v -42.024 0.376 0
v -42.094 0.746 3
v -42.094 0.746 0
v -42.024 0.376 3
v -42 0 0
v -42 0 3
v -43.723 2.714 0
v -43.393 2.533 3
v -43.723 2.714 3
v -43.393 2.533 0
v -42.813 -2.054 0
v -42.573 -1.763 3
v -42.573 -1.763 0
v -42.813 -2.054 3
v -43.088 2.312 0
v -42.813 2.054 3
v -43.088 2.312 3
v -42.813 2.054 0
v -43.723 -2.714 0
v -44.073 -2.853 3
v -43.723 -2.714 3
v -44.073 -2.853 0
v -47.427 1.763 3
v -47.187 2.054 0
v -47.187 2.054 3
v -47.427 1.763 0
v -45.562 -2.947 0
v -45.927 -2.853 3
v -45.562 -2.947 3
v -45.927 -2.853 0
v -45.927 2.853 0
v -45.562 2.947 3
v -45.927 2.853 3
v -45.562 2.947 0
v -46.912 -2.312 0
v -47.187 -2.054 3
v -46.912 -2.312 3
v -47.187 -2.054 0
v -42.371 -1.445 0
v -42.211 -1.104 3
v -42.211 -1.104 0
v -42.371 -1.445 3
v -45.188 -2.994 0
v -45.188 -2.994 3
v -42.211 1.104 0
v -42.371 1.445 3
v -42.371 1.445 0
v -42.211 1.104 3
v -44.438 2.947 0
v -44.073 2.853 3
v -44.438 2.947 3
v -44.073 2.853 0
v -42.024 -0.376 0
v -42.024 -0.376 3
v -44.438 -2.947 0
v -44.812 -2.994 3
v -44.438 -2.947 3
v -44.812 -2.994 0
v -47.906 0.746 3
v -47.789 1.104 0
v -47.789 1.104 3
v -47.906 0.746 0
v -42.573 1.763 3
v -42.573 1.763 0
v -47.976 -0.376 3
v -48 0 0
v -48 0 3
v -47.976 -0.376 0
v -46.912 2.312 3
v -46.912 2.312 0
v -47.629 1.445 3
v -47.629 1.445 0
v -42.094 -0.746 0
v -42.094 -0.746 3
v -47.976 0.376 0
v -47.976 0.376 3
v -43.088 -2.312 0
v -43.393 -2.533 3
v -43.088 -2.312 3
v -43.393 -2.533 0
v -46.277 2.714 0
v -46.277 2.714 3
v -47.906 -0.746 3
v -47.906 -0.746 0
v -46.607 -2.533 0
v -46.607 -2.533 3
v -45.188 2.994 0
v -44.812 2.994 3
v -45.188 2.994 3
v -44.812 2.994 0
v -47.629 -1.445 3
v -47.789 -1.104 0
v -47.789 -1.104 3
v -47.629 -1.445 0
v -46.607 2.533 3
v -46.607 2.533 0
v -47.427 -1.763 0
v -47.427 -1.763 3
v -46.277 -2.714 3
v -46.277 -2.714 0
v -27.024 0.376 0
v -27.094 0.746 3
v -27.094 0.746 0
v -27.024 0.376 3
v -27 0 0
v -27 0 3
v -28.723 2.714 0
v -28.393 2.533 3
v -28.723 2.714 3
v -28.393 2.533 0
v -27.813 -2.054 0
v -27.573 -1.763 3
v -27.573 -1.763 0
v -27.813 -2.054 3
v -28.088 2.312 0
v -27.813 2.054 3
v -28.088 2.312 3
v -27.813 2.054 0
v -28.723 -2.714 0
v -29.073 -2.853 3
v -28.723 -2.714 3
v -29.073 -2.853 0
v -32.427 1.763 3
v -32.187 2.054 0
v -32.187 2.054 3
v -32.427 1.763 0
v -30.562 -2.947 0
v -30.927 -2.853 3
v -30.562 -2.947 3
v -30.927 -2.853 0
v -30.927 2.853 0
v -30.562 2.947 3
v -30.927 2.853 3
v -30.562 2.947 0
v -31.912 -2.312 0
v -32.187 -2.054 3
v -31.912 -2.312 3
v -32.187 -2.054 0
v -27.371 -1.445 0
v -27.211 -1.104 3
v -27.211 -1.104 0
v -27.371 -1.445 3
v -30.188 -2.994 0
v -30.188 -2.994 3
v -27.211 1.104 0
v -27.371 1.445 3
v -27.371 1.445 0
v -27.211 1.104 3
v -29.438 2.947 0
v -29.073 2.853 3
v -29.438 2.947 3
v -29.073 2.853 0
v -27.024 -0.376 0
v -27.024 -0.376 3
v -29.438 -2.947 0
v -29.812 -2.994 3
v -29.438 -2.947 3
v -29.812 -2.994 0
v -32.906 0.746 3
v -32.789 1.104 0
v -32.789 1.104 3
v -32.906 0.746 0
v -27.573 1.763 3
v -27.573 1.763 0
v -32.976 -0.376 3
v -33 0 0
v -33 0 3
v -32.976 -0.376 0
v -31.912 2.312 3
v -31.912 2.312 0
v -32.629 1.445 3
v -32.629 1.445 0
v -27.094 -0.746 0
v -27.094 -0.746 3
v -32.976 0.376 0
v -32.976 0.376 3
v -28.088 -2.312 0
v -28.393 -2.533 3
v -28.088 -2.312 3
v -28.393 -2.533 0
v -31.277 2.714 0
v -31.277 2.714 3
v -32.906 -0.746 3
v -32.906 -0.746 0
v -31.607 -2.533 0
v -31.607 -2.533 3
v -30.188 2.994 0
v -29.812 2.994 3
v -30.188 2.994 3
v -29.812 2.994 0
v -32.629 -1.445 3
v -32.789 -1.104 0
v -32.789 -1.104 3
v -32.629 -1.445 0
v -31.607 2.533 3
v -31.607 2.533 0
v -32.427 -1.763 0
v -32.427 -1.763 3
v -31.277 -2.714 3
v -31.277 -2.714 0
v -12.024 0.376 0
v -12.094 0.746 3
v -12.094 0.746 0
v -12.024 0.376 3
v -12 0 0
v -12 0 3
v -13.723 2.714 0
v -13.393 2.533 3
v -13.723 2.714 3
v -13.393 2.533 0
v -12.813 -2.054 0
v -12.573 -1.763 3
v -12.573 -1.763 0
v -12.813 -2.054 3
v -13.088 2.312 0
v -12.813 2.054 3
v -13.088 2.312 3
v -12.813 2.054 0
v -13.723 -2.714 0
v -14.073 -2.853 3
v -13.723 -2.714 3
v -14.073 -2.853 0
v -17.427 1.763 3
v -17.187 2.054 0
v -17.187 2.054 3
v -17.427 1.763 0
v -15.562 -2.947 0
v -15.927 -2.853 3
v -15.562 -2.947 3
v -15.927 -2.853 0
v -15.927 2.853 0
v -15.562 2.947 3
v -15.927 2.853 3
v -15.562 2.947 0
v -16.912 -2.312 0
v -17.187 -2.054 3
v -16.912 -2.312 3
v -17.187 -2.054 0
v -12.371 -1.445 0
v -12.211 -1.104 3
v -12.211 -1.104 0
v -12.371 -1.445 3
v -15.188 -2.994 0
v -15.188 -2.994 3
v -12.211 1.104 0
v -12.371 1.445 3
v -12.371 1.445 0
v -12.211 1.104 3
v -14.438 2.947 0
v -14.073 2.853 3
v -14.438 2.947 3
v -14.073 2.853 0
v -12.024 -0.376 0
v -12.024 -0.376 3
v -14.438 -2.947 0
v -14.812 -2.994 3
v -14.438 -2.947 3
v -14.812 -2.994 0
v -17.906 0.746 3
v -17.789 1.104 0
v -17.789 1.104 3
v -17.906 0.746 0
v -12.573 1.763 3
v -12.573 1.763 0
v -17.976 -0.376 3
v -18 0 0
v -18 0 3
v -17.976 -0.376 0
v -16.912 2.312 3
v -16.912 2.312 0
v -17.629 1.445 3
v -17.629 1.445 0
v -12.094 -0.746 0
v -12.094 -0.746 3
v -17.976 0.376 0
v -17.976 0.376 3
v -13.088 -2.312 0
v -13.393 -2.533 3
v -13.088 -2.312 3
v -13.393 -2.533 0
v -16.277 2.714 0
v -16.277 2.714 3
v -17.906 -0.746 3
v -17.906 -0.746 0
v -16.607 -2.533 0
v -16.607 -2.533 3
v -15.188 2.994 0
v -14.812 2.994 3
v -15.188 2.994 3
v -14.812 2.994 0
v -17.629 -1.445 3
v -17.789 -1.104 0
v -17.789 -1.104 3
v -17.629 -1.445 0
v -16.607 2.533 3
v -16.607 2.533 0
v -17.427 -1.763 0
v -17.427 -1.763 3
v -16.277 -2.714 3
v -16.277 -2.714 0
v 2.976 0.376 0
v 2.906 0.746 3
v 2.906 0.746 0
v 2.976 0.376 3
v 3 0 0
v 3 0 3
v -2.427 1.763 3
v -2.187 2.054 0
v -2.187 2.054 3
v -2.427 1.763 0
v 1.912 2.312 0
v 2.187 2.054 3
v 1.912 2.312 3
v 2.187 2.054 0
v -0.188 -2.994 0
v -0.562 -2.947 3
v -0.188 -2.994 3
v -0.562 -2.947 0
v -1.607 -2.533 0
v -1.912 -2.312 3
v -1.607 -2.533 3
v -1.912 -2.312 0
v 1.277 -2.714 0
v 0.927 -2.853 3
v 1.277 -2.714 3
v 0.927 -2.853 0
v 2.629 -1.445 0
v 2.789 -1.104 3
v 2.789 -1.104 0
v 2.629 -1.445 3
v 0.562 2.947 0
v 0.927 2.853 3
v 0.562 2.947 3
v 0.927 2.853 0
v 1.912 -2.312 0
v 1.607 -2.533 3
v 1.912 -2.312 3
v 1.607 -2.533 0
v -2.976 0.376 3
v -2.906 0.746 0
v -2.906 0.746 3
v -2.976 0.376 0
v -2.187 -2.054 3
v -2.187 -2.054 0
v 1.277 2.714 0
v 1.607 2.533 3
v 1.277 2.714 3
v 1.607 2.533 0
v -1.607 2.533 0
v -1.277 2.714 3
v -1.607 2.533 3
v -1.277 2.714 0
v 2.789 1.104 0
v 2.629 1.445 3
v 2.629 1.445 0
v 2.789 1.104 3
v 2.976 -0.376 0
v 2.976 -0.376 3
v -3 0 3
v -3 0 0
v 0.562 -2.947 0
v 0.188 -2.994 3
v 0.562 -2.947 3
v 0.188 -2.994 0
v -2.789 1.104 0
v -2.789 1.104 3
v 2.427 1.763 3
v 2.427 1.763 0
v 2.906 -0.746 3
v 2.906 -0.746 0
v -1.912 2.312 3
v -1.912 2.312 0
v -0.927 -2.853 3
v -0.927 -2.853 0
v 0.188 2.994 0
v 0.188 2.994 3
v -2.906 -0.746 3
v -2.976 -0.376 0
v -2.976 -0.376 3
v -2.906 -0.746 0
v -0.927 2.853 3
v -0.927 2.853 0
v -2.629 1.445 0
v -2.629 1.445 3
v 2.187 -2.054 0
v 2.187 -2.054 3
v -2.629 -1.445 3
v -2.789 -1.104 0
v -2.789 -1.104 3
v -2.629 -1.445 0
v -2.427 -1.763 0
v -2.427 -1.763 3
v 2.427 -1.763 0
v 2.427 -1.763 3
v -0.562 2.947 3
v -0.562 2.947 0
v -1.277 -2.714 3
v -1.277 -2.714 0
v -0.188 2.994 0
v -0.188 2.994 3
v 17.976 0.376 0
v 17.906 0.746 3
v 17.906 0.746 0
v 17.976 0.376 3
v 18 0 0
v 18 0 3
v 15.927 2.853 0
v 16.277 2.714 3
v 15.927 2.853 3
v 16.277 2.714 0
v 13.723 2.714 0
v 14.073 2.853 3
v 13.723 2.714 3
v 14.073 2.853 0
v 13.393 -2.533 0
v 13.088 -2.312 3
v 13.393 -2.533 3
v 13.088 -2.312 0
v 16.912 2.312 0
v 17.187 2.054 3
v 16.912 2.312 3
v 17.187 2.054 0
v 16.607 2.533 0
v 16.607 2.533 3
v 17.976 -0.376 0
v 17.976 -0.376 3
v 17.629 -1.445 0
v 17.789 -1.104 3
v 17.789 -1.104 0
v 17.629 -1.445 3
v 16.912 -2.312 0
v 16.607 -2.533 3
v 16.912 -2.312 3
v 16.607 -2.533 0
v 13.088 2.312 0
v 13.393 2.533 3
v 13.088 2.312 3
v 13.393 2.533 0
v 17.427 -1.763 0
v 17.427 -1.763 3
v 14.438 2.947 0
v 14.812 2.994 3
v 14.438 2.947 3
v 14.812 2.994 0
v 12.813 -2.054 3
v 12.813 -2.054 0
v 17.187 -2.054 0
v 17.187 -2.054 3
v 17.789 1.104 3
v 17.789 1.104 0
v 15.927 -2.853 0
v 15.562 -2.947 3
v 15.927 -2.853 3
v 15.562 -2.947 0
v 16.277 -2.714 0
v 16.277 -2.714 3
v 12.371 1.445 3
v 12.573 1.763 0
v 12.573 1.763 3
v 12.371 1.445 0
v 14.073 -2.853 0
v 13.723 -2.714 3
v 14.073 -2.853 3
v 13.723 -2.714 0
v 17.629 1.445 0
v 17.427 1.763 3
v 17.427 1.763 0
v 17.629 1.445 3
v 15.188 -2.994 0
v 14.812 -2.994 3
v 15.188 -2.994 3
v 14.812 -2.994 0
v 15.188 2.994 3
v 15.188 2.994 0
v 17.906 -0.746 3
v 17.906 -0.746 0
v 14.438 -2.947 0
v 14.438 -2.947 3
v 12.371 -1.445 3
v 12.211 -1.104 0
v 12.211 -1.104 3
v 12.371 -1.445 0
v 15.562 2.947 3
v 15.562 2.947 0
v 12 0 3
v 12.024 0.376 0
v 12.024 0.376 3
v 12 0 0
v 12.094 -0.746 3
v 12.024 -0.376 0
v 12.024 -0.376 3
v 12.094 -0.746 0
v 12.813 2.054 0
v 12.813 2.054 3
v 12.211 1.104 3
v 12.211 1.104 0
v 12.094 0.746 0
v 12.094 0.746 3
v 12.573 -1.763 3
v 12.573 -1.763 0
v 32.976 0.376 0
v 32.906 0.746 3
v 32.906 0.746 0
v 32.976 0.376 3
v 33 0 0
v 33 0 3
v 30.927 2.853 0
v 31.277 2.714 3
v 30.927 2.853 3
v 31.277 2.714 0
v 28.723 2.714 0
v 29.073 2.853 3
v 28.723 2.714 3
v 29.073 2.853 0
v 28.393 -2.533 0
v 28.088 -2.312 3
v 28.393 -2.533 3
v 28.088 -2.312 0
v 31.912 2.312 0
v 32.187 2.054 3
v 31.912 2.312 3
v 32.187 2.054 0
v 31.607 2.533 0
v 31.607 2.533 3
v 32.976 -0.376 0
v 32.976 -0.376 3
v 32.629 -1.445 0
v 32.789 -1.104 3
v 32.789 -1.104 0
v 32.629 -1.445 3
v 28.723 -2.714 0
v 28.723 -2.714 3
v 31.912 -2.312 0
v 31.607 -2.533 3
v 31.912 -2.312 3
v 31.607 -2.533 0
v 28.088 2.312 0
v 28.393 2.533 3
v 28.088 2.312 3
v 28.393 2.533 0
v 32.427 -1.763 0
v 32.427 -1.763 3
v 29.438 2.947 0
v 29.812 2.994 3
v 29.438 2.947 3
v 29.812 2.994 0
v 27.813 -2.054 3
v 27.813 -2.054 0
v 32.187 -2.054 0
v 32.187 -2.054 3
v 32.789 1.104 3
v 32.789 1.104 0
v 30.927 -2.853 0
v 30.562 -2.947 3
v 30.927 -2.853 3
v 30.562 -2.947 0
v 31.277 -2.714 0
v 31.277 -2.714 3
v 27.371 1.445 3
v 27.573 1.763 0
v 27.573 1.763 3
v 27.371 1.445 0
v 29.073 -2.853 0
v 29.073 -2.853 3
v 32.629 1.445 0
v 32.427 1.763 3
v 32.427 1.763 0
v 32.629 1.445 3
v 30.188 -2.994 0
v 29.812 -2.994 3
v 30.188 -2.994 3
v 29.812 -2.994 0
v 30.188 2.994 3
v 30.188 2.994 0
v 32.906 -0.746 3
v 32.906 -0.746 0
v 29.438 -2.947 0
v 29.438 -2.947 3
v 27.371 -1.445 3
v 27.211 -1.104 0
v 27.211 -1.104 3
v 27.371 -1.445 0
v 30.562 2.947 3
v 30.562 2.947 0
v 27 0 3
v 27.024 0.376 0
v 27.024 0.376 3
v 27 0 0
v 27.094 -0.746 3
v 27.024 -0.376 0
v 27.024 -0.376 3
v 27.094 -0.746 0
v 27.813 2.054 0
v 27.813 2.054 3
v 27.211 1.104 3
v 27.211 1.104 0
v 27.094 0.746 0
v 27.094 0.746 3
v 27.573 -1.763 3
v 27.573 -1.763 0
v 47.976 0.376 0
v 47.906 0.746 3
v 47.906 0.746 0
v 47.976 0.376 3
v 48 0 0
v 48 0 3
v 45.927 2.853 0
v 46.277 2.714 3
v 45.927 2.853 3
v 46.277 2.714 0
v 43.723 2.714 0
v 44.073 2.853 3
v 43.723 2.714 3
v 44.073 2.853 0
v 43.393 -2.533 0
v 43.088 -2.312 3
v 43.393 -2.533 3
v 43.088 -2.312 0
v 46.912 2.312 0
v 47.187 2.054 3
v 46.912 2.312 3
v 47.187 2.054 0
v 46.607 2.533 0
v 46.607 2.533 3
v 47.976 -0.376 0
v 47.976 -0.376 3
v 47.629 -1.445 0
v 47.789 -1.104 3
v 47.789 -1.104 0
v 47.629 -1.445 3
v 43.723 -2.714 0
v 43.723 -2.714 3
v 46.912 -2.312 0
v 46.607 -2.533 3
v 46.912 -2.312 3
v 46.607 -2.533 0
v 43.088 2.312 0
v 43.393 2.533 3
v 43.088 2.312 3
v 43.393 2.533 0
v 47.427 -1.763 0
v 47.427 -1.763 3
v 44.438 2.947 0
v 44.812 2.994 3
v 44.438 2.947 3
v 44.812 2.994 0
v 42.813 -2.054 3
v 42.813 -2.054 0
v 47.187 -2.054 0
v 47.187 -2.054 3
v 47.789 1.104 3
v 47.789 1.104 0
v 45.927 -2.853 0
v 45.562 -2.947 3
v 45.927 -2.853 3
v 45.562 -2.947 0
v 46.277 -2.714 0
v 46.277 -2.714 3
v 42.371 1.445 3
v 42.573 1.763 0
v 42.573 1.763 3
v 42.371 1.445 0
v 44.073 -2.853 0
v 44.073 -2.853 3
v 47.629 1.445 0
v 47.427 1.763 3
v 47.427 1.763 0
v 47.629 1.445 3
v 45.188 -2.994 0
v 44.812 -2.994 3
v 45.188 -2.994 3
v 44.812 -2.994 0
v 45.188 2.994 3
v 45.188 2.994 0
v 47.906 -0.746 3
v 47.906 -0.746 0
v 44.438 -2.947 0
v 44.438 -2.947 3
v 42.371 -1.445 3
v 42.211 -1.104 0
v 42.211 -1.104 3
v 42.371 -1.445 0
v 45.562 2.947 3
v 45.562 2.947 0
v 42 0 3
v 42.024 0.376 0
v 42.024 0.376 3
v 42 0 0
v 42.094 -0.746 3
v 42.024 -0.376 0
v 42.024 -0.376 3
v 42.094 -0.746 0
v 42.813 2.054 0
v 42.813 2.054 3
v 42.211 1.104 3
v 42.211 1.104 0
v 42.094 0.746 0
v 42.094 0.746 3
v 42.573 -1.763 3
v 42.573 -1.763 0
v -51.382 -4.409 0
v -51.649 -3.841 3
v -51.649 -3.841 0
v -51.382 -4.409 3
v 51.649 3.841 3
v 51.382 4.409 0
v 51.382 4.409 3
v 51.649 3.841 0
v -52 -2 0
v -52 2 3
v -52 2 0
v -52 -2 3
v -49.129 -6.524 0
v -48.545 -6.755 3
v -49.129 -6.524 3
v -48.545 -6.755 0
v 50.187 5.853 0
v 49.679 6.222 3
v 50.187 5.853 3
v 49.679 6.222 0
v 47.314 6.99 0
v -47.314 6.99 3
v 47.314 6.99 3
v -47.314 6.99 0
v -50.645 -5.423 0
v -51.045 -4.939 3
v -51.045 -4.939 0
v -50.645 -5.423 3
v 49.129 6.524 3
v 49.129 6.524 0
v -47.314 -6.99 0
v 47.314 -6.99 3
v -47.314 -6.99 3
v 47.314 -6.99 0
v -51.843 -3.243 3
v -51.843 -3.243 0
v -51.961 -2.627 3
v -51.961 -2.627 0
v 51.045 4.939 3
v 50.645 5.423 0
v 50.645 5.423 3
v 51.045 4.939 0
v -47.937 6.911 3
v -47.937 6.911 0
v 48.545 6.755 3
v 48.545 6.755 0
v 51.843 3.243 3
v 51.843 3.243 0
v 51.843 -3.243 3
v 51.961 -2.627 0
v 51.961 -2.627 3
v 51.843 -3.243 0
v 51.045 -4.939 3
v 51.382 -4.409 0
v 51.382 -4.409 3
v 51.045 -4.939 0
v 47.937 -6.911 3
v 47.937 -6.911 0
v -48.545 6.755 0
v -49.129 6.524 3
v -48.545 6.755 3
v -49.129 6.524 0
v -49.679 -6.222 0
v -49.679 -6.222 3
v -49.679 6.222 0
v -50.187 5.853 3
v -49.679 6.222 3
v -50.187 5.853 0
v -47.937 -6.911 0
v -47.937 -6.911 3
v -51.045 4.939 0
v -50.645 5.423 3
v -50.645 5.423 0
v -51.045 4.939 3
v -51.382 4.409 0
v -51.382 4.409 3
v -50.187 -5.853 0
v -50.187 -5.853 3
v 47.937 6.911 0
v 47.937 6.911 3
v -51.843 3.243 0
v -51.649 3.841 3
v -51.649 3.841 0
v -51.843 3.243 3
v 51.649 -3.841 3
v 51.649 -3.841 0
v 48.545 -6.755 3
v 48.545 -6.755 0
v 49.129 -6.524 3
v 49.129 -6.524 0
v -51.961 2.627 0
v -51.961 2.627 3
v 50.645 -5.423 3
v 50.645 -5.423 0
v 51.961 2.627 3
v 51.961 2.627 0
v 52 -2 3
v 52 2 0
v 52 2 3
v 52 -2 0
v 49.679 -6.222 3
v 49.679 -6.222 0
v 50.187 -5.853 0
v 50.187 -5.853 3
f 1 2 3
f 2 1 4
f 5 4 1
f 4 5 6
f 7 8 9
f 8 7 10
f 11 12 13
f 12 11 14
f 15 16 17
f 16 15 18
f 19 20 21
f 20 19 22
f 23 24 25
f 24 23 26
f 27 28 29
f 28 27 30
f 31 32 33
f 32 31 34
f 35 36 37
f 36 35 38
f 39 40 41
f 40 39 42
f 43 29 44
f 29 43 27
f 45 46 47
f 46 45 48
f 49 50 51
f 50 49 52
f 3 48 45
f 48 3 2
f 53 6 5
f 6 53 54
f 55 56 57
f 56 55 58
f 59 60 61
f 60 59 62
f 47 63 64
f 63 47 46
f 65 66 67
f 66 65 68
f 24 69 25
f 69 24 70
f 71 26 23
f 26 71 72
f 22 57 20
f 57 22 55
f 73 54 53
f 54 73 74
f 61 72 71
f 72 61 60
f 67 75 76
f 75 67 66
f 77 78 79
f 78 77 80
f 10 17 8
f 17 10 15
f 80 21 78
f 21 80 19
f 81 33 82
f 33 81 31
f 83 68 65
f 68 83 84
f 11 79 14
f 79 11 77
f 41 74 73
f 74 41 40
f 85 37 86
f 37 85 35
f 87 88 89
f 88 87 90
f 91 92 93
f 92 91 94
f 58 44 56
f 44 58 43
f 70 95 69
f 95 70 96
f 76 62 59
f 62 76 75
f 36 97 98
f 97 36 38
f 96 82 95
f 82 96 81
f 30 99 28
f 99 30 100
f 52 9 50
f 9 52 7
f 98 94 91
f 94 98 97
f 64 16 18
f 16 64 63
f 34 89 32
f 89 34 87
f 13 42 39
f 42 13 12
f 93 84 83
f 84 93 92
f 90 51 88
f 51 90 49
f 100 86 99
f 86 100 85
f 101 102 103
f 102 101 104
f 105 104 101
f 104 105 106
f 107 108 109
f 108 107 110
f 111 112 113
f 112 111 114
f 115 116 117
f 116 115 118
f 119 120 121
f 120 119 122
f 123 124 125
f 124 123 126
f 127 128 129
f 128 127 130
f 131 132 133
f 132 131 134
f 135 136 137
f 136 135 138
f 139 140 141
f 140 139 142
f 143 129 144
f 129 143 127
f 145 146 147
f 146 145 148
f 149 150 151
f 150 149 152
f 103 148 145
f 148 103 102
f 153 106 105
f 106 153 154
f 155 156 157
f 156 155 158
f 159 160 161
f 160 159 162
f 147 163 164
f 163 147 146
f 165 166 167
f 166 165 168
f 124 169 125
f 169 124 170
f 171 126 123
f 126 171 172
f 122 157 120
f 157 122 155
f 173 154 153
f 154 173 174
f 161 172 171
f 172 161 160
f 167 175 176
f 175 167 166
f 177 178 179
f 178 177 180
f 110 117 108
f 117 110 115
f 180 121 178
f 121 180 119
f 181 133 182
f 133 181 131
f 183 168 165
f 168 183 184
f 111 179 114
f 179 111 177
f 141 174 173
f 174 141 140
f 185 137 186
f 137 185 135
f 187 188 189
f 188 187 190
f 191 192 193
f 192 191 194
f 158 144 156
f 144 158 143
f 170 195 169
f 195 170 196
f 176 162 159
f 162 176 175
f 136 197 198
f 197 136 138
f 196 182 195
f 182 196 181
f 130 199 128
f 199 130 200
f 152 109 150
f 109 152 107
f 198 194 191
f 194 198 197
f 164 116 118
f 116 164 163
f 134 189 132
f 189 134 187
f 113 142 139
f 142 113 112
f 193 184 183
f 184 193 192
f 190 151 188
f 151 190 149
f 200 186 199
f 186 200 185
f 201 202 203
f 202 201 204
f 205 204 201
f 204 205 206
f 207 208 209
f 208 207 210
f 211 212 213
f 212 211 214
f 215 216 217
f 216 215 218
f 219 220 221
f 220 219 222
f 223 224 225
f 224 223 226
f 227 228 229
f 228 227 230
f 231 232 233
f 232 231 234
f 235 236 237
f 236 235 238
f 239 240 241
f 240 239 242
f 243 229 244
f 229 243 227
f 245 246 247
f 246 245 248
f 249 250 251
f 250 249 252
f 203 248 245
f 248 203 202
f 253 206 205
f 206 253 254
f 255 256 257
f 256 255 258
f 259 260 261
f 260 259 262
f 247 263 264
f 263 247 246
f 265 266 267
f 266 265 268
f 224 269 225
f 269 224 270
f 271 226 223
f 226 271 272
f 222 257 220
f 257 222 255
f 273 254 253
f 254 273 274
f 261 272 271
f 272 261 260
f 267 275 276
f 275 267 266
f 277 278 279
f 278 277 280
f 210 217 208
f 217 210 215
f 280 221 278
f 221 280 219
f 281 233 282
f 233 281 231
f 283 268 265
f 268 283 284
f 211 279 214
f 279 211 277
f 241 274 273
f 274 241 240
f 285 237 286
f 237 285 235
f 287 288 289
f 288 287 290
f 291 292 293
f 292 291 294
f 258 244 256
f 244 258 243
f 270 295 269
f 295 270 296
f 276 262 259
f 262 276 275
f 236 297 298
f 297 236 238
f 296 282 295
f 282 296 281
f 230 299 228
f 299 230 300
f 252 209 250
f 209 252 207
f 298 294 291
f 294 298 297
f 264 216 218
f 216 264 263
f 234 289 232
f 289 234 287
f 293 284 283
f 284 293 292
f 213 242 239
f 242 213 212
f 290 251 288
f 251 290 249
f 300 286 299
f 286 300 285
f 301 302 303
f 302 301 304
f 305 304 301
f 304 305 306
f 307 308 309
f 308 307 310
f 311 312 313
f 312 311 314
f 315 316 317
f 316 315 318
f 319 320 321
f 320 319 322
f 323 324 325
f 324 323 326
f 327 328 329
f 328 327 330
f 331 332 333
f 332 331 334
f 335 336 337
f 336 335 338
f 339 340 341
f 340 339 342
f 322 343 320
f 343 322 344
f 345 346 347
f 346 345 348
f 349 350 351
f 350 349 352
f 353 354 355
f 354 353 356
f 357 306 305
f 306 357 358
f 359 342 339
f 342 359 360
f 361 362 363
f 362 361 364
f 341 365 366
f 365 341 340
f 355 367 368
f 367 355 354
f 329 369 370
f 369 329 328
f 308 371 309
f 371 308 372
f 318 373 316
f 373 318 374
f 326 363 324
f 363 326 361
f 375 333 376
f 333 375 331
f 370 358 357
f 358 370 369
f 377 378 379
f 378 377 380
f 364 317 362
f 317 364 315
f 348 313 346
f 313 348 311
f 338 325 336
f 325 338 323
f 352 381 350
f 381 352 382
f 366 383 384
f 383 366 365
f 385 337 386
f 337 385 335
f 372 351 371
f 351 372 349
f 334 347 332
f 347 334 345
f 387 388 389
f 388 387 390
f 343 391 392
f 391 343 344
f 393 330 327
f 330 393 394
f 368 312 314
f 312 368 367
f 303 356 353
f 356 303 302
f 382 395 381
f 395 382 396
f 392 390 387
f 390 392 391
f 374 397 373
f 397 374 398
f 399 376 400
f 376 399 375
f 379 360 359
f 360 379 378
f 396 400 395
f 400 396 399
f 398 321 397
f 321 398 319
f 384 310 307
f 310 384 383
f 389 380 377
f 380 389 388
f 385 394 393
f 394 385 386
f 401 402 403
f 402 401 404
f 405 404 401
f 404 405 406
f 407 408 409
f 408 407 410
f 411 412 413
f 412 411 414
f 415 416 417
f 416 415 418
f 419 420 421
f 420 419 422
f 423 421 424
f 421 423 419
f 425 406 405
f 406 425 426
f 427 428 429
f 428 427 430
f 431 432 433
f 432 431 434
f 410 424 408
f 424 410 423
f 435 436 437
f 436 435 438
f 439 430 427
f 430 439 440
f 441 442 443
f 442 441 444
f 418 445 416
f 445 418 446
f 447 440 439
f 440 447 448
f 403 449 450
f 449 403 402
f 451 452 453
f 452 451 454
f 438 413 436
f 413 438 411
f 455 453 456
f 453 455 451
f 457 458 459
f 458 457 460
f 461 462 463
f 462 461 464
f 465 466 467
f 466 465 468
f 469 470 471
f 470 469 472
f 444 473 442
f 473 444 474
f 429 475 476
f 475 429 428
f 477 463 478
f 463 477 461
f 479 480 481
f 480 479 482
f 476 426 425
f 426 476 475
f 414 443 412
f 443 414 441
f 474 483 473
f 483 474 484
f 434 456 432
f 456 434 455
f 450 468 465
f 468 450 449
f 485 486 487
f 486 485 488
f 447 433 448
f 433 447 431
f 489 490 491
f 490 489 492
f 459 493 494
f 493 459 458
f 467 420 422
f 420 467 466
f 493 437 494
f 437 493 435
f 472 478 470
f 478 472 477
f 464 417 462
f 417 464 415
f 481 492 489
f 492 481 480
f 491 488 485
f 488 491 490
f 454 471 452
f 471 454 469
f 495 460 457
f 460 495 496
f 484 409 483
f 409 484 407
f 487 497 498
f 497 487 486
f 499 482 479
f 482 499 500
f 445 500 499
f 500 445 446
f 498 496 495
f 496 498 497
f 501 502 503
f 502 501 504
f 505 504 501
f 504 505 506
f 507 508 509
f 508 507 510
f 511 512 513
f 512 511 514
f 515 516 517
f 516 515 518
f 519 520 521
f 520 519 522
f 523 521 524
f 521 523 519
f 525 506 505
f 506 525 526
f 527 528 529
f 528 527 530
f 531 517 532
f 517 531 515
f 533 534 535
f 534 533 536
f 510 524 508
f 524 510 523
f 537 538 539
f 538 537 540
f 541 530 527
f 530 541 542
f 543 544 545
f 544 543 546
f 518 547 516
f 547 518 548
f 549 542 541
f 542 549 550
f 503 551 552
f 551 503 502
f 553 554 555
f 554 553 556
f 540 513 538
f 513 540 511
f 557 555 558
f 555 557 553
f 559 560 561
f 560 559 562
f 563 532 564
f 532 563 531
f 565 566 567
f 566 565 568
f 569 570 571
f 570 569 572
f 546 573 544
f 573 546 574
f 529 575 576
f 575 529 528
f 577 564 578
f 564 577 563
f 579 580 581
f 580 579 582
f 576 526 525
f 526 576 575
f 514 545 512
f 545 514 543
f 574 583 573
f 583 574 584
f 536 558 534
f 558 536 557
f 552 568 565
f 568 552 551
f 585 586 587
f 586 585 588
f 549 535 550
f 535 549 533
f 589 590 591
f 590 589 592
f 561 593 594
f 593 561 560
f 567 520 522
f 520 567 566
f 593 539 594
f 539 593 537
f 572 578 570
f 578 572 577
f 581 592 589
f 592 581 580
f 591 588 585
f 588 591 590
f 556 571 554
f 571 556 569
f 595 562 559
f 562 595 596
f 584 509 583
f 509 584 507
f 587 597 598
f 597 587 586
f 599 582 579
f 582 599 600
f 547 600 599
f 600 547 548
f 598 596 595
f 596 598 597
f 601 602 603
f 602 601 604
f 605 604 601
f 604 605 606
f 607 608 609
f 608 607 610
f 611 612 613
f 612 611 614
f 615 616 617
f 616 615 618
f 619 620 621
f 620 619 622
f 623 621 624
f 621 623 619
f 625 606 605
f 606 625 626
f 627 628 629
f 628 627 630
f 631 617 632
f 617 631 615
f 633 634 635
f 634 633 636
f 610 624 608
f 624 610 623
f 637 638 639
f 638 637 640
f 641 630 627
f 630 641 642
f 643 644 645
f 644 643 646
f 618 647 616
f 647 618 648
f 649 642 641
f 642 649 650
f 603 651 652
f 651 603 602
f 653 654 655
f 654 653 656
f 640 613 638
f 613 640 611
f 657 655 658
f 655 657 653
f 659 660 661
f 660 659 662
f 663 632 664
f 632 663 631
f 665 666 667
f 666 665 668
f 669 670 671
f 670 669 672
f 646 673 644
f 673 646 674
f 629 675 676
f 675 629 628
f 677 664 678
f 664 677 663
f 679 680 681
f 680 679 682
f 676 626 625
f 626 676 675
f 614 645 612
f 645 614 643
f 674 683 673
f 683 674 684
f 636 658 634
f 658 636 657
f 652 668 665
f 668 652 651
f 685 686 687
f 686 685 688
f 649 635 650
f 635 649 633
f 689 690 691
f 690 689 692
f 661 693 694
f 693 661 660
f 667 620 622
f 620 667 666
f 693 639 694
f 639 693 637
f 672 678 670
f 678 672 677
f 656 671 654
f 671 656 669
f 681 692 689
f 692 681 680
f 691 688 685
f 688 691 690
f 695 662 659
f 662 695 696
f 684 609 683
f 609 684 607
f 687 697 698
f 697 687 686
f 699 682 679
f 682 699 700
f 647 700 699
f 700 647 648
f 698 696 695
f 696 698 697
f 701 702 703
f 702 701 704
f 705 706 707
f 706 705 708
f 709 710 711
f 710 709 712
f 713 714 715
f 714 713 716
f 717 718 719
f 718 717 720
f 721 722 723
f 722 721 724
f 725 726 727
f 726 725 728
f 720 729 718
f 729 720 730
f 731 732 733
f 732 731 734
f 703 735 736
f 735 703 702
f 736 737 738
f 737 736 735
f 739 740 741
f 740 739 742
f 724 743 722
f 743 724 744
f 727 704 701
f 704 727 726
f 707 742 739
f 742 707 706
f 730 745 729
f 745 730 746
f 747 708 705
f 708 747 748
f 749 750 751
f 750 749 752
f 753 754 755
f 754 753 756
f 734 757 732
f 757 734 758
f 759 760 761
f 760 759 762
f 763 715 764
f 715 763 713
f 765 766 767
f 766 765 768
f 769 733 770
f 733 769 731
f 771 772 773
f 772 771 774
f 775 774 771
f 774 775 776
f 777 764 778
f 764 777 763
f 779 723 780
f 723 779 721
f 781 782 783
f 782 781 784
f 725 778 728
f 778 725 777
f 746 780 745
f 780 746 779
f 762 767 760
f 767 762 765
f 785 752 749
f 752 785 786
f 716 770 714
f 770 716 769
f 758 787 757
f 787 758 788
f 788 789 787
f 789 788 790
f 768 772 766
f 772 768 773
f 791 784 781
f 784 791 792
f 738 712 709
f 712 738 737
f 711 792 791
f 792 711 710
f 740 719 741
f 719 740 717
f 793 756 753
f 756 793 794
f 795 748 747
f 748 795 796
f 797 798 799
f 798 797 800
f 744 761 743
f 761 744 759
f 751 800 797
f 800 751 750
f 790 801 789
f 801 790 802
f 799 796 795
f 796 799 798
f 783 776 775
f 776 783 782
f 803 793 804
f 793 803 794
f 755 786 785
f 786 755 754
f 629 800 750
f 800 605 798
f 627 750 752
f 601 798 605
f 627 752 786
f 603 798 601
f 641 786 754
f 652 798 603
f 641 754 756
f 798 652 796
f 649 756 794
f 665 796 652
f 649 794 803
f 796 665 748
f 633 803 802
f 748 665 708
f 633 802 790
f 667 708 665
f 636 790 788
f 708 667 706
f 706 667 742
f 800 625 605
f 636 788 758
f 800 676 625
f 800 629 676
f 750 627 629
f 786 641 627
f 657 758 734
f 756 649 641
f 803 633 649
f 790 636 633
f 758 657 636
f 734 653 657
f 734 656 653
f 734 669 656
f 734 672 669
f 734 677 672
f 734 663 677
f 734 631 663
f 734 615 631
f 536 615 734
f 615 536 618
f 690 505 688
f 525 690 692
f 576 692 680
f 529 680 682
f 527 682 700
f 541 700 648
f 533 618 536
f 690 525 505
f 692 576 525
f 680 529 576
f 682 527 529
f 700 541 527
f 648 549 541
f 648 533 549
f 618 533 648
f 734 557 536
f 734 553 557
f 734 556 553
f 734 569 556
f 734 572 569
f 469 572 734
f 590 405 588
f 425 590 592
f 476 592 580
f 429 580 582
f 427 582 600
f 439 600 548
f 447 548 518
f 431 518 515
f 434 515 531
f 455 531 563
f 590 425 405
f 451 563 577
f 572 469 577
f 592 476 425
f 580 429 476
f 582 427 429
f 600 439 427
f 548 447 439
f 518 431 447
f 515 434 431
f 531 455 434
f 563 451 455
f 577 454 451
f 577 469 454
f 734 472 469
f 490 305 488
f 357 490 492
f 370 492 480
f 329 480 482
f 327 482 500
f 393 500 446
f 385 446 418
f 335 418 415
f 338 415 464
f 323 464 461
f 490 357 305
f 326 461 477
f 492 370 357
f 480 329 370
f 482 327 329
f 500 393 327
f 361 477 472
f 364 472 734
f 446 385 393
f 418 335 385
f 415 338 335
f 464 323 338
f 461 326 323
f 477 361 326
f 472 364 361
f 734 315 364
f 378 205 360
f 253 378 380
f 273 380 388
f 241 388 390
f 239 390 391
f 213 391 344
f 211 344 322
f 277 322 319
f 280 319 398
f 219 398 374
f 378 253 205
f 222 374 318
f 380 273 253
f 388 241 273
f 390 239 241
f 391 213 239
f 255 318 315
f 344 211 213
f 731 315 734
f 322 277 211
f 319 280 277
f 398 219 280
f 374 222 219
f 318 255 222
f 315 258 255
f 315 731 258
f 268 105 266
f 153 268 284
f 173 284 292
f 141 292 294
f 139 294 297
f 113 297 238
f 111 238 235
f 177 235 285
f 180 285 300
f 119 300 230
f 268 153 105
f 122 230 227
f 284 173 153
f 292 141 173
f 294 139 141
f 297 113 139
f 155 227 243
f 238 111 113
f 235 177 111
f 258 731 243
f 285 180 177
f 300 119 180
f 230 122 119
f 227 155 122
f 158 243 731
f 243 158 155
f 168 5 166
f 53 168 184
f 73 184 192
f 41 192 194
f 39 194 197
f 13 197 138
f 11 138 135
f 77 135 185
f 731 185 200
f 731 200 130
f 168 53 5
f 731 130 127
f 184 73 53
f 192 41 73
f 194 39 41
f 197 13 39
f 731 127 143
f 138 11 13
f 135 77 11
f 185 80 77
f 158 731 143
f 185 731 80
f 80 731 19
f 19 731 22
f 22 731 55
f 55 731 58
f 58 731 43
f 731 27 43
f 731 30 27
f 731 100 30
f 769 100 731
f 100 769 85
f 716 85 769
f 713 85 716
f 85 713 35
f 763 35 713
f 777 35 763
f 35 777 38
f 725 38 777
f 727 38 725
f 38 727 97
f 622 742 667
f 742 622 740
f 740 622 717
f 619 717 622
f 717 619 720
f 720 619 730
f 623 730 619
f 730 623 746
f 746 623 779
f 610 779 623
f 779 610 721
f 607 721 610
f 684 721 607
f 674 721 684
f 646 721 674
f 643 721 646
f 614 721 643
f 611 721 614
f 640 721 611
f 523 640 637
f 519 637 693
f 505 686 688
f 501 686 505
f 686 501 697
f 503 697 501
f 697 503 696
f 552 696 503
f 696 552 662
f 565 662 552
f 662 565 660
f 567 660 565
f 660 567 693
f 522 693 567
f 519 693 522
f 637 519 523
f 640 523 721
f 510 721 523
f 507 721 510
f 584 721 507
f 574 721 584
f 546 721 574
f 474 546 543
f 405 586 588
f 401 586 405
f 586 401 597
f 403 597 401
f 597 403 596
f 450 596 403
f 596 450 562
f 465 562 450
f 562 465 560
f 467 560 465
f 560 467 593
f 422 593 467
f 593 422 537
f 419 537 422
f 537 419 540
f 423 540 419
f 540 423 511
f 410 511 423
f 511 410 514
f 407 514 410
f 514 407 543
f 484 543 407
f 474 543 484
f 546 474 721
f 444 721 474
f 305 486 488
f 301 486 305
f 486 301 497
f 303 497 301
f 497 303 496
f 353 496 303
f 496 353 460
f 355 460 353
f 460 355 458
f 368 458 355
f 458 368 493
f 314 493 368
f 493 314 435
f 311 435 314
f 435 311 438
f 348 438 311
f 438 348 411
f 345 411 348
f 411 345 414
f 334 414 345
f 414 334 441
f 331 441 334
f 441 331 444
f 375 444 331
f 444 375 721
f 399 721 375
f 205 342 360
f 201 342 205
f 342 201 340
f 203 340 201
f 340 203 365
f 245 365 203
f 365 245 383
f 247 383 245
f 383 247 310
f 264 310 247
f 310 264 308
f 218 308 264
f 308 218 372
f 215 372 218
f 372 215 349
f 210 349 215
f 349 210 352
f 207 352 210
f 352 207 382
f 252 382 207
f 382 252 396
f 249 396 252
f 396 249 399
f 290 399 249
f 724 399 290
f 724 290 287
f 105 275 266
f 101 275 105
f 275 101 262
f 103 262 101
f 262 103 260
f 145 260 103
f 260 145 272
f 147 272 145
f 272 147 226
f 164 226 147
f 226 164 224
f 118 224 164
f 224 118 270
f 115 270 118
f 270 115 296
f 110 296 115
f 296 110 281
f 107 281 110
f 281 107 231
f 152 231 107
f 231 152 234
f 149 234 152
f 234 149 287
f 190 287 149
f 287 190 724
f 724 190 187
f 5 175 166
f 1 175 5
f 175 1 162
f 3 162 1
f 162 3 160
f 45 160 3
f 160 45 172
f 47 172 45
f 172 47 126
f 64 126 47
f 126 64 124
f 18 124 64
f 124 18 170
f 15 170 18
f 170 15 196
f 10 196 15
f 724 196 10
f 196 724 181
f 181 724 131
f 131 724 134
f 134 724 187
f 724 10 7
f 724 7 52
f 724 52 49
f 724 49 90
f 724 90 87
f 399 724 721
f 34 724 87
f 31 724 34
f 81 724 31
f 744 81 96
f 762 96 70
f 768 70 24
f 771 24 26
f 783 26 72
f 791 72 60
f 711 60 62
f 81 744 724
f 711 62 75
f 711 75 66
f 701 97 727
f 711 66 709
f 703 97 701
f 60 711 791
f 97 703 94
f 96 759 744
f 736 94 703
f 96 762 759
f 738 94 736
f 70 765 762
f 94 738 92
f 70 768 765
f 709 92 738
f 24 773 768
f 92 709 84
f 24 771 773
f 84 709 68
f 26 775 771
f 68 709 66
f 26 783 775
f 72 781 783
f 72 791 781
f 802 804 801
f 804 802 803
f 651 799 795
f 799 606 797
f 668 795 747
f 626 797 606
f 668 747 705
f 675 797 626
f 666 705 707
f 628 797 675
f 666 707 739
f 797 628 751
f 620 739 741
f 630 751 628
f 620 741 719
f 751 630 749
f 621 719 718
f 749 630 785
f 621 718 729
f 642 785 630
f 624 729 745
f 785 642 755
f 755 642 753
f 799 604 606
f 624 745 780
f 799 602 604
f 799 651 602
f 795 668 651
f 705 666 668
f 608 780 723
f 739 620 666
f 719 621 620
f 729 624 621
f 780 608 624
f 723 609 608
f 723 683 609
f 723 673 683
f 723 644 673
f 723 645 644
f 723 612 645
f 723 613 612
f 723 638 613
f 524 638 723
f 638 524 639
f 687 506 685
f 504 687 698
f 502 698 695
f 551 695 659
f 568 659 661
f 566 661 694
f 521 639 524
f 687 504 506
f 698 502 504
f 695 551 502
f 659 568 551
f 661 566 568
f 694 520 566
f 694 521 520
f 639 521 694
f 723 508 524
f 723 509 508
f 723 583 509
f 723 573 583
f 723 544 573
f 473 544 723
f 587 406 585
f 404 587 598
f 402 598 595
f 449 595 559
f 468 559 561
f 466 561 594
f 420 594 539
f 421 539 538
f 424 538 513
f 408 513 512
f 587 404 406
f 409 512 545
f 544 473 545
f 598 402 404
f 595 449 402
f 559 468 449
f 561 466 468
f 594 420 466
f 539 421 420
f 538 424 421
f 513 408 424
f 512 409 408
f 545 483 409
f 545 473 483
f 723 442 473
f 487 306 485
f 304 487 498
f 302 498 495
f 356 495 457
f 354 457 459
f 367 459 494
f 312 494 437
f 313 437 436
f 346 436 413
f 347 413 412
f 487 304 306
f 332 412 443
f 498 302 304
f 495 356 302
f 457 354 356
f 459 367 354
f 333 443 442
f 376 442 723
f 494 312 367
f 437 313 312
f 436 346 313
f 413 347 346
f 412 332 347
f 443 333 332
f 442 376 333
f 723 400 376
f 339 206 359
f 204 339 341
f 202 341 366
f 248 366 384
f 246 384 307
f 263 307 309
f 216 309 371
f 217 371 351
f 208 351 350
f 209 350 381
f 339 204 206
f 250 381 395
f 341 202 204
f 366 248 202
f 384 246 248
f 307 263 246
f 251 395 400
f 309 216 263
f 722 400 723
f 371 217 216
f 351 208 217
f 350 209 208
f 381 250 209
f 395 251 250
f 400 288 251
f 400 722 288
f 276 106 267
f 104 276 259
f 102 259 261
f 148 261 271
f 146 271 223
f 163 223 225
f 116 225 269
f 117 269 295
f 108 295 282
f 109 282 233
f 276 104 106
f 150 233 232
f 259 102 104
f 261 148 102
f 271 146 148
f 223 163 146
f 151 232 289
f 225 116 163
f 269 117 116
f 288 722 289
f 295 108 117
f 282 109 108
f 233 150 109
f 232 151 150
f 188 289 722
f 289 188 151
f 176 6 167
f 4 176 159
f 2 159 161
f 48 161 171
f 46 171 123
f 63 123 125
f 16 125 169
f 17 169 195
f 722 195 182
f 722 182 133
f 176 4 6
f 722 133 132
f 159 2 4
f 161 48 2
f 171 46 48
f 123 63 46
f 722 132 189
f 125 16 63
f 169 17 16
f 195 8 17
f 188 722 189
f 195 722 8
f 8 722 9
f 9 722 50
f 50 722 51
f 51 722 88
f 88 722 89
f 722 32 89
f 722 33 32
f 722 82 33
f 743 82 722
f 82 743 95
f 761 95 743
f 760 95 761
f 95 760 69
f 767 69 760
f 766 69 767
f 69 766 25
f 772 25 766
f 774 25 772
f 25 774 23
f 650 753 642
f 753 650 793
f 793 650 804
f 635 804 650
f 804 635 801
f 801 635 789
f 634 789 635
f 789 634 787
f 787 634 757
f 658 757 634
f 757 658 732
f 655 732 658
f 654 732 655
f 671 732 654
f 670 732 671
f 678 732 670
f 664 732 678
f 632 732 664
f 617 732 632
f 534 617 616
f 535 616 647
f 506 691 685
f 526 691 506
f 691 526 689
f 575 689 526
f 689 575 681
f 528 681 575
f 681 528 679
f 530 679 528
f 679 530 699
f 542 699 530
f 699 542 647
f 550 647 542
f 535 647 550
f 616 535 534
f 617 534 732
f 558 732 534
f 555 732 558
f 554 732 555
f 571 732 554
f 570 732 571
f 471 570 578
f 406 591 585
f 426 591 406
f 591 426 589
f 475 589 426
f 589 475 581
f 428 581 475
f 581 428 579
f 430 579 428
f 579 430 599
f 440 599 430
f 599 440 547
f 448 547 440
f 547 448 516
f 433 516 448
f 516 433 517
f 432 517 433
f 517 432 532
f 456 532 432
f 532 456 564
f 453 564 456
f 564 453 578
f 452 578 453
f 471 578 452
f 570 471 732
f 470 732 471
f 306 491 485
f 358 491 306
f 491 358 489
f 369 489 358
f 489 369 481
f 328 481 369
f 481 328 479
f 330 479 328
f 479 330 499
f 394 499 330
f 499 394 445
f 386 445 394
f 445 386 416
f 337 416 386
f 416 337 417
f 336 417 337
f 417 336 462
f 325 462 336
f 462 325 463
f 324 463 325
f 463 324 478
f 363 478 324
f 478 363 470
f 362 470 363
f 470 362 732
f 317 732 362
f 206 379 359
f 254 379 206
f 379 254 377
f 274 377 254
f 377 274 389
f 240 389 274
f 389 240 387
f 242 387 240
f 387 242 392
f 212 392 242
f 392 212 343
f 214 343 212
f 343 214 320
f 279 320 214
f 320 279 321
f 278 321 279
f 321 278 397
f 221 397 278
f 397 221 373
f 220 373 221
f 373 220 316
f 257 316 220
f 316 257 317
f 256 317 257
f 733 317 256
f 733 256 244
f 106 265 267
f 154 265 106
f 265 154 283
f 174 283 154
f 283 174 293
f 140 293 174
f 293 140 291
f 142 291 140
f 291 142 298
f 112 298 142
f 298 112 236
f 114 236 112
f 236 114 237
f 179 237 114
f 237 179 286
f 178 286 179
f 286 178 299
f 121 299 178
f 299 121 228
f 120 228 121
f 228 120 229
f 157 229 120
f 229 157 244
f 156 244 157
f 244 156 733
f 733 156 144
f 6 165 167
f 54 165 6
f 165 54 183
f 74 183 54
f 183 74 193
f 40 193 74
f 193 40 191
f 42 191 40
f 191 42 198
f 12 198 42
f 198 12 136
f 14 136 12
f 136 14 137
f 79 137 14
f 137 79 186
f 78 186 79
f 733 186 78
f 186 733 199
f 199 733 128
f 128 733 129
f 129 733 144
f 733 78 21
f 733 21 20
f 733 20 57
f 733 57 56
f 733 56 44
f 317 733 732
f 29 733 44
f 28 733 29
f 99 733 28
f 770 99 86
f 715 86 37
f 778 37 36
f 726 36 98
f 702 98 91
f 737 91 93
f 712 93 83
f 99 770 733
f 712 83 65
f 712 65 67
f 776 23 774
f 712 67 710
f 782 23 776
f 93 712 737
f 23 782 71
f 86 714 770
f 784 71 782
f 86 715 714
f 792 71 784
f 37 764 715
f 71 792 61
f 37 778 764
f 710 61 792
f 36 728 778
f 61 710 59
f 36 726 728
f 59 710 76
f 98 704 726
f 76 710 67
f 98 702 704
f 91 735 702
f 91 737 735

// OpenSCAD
// Generated by SolidPython 1.1.3 on 2023-03-12 22:44:58
$fn = 50;


difference() {
	union() {
		translate(v = [0, 0, 0]) {
			rotate(a = [0, 0, 0]) {
				hull() {
					translate(v = [-47.0000000000, 2.0000000000, 0]) {
						rotate(a = [0, 0, 0]) {
							translate(v = [0, 0, 0]) {
								rotate(a = [0, 0, 0]) {
									cylinder(h = 3, r = 5);
								}
							}
						}
					}
					translate(v = [47.0000000000, 2.0000000000, 0]) {
						rotate(a = [0, 0, 0]) {
							translate(v = [0, 0, 0]) {
								rotate(a = [0, 0, 0]) {
									cylinder(h = 3, r = 5);
								}
							}
						}
					}
					translate(v = [-47.0000000000, -2.0000000000, 0]) {
						rotate(a = [0, 0, 0]) {
							translate(v = [0, 0, 0]) {
								rotate(a = [0, 0, 0]) {
									cylinder(h = 3, r = 5);
								}
							}
						}
					}
					translate(v = [47.0000000000, -2.0000000000, 0]) {
						rotate(a = [0, 0, 0]) {
							translate(v = [0, 0, 0]) {
								rotate(a = [0, 0, 0]) {
									cylinder(h = 3, r = 5);
								}
							}
						}
					}
				}
			}
		}
	}
	union() {
		translate(v = [-45.0000000000, 0.0000000000, 0]) {
			rotate(a = [0, 0, 0]) {
				translate(v = [0, 0, -50]) {
					rotate(a = [0, 0, 0]) {
						cylinder(h = 100, r = 3.0000000000);
					}
				}
			}
		}
		translate(v = [-30.0000000000, 0.0000000000, 0]) {
			rotate(a = [0, 0, 0]) {
				translate(v = [0, 0, -50]) {
					rotate(a = [0, 0, 0]) {
						cylinder(h = 100, r = 3.0000000000);
					}
				}
			}
		}
		translate(v = [-15.0000000000, 0.0000000000, 0]) {
			rotate(a = [0, 0, 0]) {
				translate(v = [0, 0, -50]) {
					rotate(a = [0, 0, 0]) {
						cylinder(h = 100, r = 3.0000000000);
					}
				}
			}
		}
		translate(v = [0.0000000000, 0.0000000000, 0]) {
			rotate(a = [0, 0, 0]) {
				translate(v = [0, 0, -50]) {
					rotate(a = [0, 0, 0]) {
						cylinder(h = 100, r = 3.0000000000);
					}
				}
			}
		}
		translate(v = [15.0000000000, 0.0000000000, 0]) {
			rotate(a = [0, 0, 0]) {
				translate(v = [0, 0, -50]) {
					rotate(a = [0, 0, 0]) {
						cylinder(h = 100, r = 3.0000000000);
					}
				}
			}
		}
		translate(v = [30.0000000000, 0.0000000000, 0]) {
			rotate(a = [0, 0, 0]) {
				translate(v = [0, 0, -50]) {
					rotate(a = [0, 0, 0]) {
						cylinder(h = 100, r = 3.0000000000);
					}
				}
			}
		}
		translate(v = [45.0000000000, 0.0000000000, 0]) {
			rotate(a = [0, 0, 0]) {
				translate(v = [0, 0, -50]) {
					rotate(a = [0, 0, 0]) {
						cylinder(h = 100, r = 3.0000000000);
					}
				}
			}
		}
	}
}
/***********************************************
*********      SolidPython code:      **********
************************************************
 
from solid import *
import os
import subprocess

import oomB

import opsc_library_gen

mode = "laser"
#mode = "3d_print"

defined_objects = {}

radius_dict = {}
countersunk_dict = {}


def set_mode(m):
    global mode
    mode = m
    radius_dict['M6'] = 6.5/2
    radius_dict['M3'] = 3.3/2
    if mode == "laser":
        radius_dict['M6'] = 6/2
        radius_dict['M3'] = 3/2

    countersunk_dict['M3'] = {}
    countersunk_dict['M3']['little_rad'] = radius_dict['M3']
    countersunk_dict['M3']['big_rad'] = (5.5+0.6)/2
    if mode == "laser":
        countersunk_dict['M3']['big_rad'] = (4.75+0.6)/2
        countersunk_dict['M3']['little_rad'] = (4.75+0.6)/2

    countersunk_dict['M3']['height'] = 1.7


def opsc_make_object(filename, objects, save_type="none",resolution=50, layers = 1, tilediff = 200, mode="laser", overwrite=True):
    if overwrite or not os.path.exists(filename):
        set_mode(mode)
        save_type = save_type.lower()
        os.makedirs(os.path.dirname(filename), exist_ok=True)
        final_object = opsc_get_object(objects, mode = mode)
        # Save the final object to the specified filename    
        scad_render_to_file(final_object, filename, file_header='$fn = %s;' % resolution, include_orig_code=True)
        if mode == "laser":
            filename_laser = filename.replace(".scad","-flat.scad")
            scad_render_to_file(getLaser(final_object, layers=layers, tilediff=tilediff), filename_laser, file_header='$fn = %s;' % resolution, include_orig_code=True)
            if save_type == "all":
                saveToAll(filename_laser)
            elif save_type == "dxf":
                saveToDxf(filename_laser)
        if save_type == "all":
            saveToAll(filename)
        elif save_type == "dxf":
            saveToDxf(filename)


def opsc_get_object(objects, mode = "laser"):
    # Create the solidpython objects only include the positive objects and if they don't have inclusion or their inclusion is either all or mode
    # Initialize an empty list to store the results
    positive_objects = []

    # Iterate over the "objects" list
    for obj in objects:
        # Check if the current object has a "type" key with a value of "positive"
        if obj['type'] == 'positive':
            # Check if the current object has an "inclusion" key and its value matches "mode",
            # or if the current object does not have an "inclusion" key at all
            if not 'inclusion' in obj or obj['inclusion'] == "all" or obj['inclusion'] == mode:
                # Call the "get_opsc_item" function with the current object as an argument
                opsc_item = get_opsc_item(obj)
                # Add the result to the "positive_objects" list
                positive_objects.append(opsc_item)
# Initialize an empty list to store the results
    negative_objects = []

    # Iterate over the "objects" list
    for obj in objects:
        # Check if the current object has a "type" key with a value of "negative"
        if obj['type'] == 'negative':
            # Check if the current object has an "inclusion" key and its value matches "mode",
            # or if the current object does not have an "inclusion" key at all
            if not 'inclusion' in obj or obj['inclusion'] == "all" or obj['inclusion'] == mode:
                # Call the "get_opsc_item" function with the current object as an argument
                opsc_item = get_opsc_item(obj)
                # Add the result to the "negative_objects" list
                negative_objects.append(opsc_item)
    
    #positive_objects = [get_opsc_item(obj) for obj in objects if obj['type'] == 'positive']
    #negative_objects = [get_opsc_item(obj) for obj in objects if obj['type'] == 'negative']
    # Union the positive objects
    positive_object = union()(*positive_objects)
    # Union the negative objects
    negative_object = union()(*negative_objects)
    # Create the final object by subtracting the negative objects from the positive objects
    return difference()(positive_object, negative_object)

def get_opsc_item(params):
    # A dictionary to map radius string values to numerical values
    #radius_dict = {'small': 5, 'medium': 10, 'large': 15}
    # An array of function names for basic shapes
    basic_shapes = ['cube', 'sphere', 'cylinder']
    
    # An array of function names for other shapes
    other_shapes = ['hole', 'slot', 'rounded_rectangle', 'countersunk']
    


    # Convert radius to r if present, and remove radius from the params dictionary
    if 'radius' in params:
        if isinstance(params['radius'], str):
            # Use the radius_dict to map the radius string value to a numerical value
            params['r'] = radius_dict[params['radius']]
        else:
            params['r'] = params['radius']
        del params['radius']
    

    # Check if the object type is a basic shape
    if params['shape'] in basic_shapes:
        # Remove shape and unexpected dictionary values
        allowed_keys = {'size', 'r', 'r1', 'r2', 'd', 'h', 'rw', 'rh', 'dw', 'dh'}
        shape_params = {k: v for k, v in params.items() if k in allowed_keys}

        # Call the corresponding function for the shape parameter, using ** notation to pass the shape_params dictionary as keyword arguments
        return get_opsc_transform(params,globals()[params['shape']](**shape_params))
    
    # If the object type is not a basic shape, check if it's a defined object or one of the other shapes
    elif params['shape'] in other_shapes:
        # Call the corresponding function for the shape parameter, passing the params dictionary as an argument
        p2 = copy.deepcopy(params)
        p2["pos"] = [0,0,0]
        return get_opsc_transform(params,globals()[params['shape']](p2))
    
    # If the object is not a basic shape or a defined object, try to import it from a .scad file
    else:
        obj = defined_objects[params['shape']]
        return get_opsc_transform(params,obj)

def get_opsc_transform(params, solid_obj):
    # Rotate the object based on the 'rot' field in the params dictionary, or the 'rotX', 'rotY', and 'rotZ' fields if 'rot' is not present
    rot = params.get('rot', [])
    if rot:
        rotX, rotY, rotZ = rot
    else:
        rotX = params.get('rotX', 0)
        rotY = params.get('rotY', 0)
        rotZ = params.get('rotZ', 0)
    solid_obj = rotate([rotX, rotY, rotZ])(solid_obj)

    # Translate the object based on the 'pos' field in the params dictionary, or the 'x', 'y', and 'z' fields if 'pos' is not present
    pos = params.get('pos', [])
    if pos:
        x, y, z = pos
    else:
        x = params.get('x', 0)
        y = params.get('y', 0)
        z = params.get('z', 0)
    solid_obj = translate([x, y, z])(solid_obj)
    return solid_obj


import random

def opsc_easy_array(type, shape, repeats, pos_start, shift_arr, **kwargs):
    for i in range(0,3):
        repeats.append(1)
        pos_start.append(0)
        shift_arr.append(0)
    return_objects = []

    for x in range(0,repeats[0]):
        for y in range(0,repeats[1]):
            for z in range(0,repeats[2]):
                return_objects.append(opsc_easy(type, shape, pos=[pos_start[0]+x*shift_arr[0],pos_start[1]+y*shift_arr[1],pos_start[2]+z*shift_arr[2]], **kwargs))
    return return_objects                



def opsc_easy(type, shape, **kwargs):
    obj = {
        'type': type,
        'shape': shape
    }
    for param in ['size', 'r', 'r1', 'r2', 'd', 'h', 'rw', 'rh', 'dw', 'dh', 'pos', 'x', 'y', 'z', 'rot', 'rotX', 'rotY', 'rotZ', "w", "inclusion"]:
        if param in kwargs:
            obj[param] = kwargs[param]
    return obj

def hole(params):
    p2 = copy.deepcopy(params)  
    # Check if the radius is a string and replace it with the corresponding value from the dictionary
    if isinstance(p2['r'], str):
        p2['r'] = radius_dict[p2['r']]
    
    # Set the height to 100 if not specified
    if 'h' not in p2:
        p2['h'] = 100
        p2["pos"] = [0,0,-50]
    p2["center"] = True
    # Create the cylinder object
    p2["shape"] = "cylinder"
    p2["type"] = "positive"

    return get_opsc_item(p2)

import copy

def countersunk(params):
    p2 = copy.deepcopy(params)
    counter_rad = p2['r']
    p2['r'] = radius_dict[p2['r']]
    hp = copy.deepcopy(p2)
    hp["type"] = "positive"
    hp["shape"] = "hole"
    del hp["rot"]
    hol = get_opsc_item(hp)
    
    cp = copy.deepcopy(p2)
    cp["h"] = countersunk_dict[counter_rad]["height"]
    cp["r2"] = countersunk_dict[counter_rad]["little_rad"]
    cp["r1"] = countersunk_dict[counter_rad]["big_rad"]
    del cp["r"]
    del cp["rot"]
    cp["type"] = "positive"
    cp["shape"] = "cylinder"
    cp["pos"] = [0,0,0]

    top = get_opsc_item(cp)
    return union()(hol,top)



def slot(params):  
    p2 = copy.deepcopy(params) 
    if isinstance(p2['r'], str):
        p2['r'] = radius_dict[p2['r']]
    p2["type"] = "positive"
    p2["shape"] = "hole"
    del p2["rot"]
    p2["pos"] = [0,0,0]
    left = copy.deepcopy(p2)
    right = copy.deepcopy(p2)
    left["pos"][0] = p2["w"] / 2 - p2["r"] 
    
    right["pos"][0] = -p2["w"] / 2 + p2["r"] 
    pass
    leftObj = get_opsc_item(left)
    rightObj = get_opsc_item(right)
    return hull()(leftObj, rightObj)

def rounded_rectangle(params):   
    p2 = copy.deepcopy(params) 
    p2["h"] = p2["size"][2]
    p2["pos"] = p2.get("pos", [0, 0, 0]) 
    p2["type"] = "positive"
    p2["shape"] = "hole"
    p2["pos"] = [0,0,0]
    
    if 'rot' in p2:
        del p2["rot"]   
    if 'r' not in p2:
        p2["r"] = 5 
    tl = copy.deepcopy(p2)
    tr = copy.deepcopy(p2)
    bl = copy.deepcopy(p2)
    br = copy.deepcopy(p2)
    tl["pos"][0] = -(p2["size"][0] - p2["r"]*2)/2
    tl["pos"][1] = (p2["size"][1] - p2["r"]*2)/2
    tr["pos"][0] = (p2["size"][0] - p2["r"]*2)/2
    tr["pos"][1] = (p2["size"][1] - p2["r"]*2)/2
    bl["pos"][0] = -(p2["size"][0] - p2["r"]*2)/2
    bl["pos"][1] = -(p2["size"][1] - p2["r"]*2)/2
    br["pos"][0] = (p2["size"][0] - p2["r"]*2)/2
    br["pos"][1] = -(p2["size"][1] - p2["r"]*2)/2
    del tl["size"]
    del tr["size"]
    del bl["size"]
    del br["size"]
    tlo = get_opsc_item(tl)
    tro = get_opsc_item(tr)
    blo = get_opsc_item(bl)
    bro = get_opsc_item(br)    
    return hull()(tlo, tro, blo, bro)



def import_scad_object(filename):
    # Import the .scad file and convert it to a solidpython object
    #filename = "parts"
    obj = import_scad(filename)
    return obj.main()
    


import os
import solid as solidpython

# A dictionary to store the defined objects


def load_scad_objects():
    opsc_library_gen.gen_library(defined_objects)

import random

def test(num_objects):
    objects = []
    for i in range(num_objects):
        # Choose a random shape
        #shape = random.choice(['cube', 'sphere', 'cylinder', 'hole', 'slot', "rounded_rectangle"])
        shape = random.choice(["rounded_rectangle"])

        # Choose a random type
        type = random.choice(['positive', 'negative'])
        
        # Create an empty object dictionary
        obj = {'shape': shape, 'type': type}
        
        # Set shape-specific parameters
        if obj['shape'] in ['cube']:
            obj['size'] =  [random.uniform(5, 15), random.uniform(5, 15), random.uniform(5, 15)]
        if obj['shape'] in ['rounded_rectangle']:
            obj['size'] =  [random.uniform(5, 15), random.uniform(5, 15), random.uniform(5, 15)]
            obj['r'] = random.uniform(0.5, 5)
        elif obj['shape'] == 'sphere':
            obj['r'] = random.uniform(5, 15)
        elif obj['shape'] in ['cylinder', 'hole']:
            obj['r'] = random.uniform(0.5, 5)
            obj['h'] = random.uniform(5, 15)
        elif obj['shape'] == 'slot':
            obj['r'] = random.uniform(0.5, 5)
            obj['h'] = random.uniform(5, 15)
            obj['w'] = random.uniform(5, 15)
        
        # Set a random position and rotation
        obj['pos'] = [random.uniform(-20, 20), random.uniform(-20, 20), random.uniform(-20, 20)]
        obj['rot'] = [random.uniform(-180, 180), random.uniform(-180, 180), random.uniform(-180, 180)]
        
        # Add the object to the list
        objects.append(obj)
    return objects

####### old file saving
def saveToAll(fileIn):
    saveToDxf(fileIn)
    saveToPng(fileIn)
    saveToStl(fileIn)
    saveToSvg(fileIn)

def saveToDxf(fileIn, fileOut="", copy_to_laser=True):
    if fileOut == "":
        fileOut = fileIn.replace(".scad",".dxf")
    saveToFile(fileIn, fileOut)


    
def saveToPng(fileIn, fileOut="",extra="--render"):
    if fileOut == "":
        fileOut = fileIn.replace(".scad",".png")
    saveToFile(fileIn, fileOut)

def saveToStl(fileIn, fileOut=""):
    if fileOut == "":
        fileOut = fileIn.replace(".scad",".stl")
    saveToFile(fileIn, fileOut)
    
def saveToSvg(fileIn, fileOut=""):
    if fileOut == "":
        fileOut = fileIn.replace(".scad",".svg")
    saveToFile(fileIn, fileOut)

def saveToFile(fileIn, fileOut,extra=""):
    #extra = extra + " --colorscheme Tomorrow"

    launchStr = 'openscad -o "' + fileOut + '"' + extra + ' "' + fileIn + '"'
    if ".png" in fileOut:
        launchStr = launchStr + " --render"
    print("            saveToFile launch string: " + launchStr)
    subprocess.run(launchStr)
    x=0

def getLaser(final_object,start=1.5,layers=1,thickness=3,tilediff=200):
        rv= []

        for x in range(layers):
            rv.append(translate([0,x*tilediff,0])(
                    projection()(
                        intersection()(translate([-500,-500,start+x*thickness])(cube(size=[1000,1000,0.1])),
                            final_object
                        )
                    )
            )
            )
            
        return union()(rv)

set_mode("laser")
load_scad_objects() 
 
************************************************/
